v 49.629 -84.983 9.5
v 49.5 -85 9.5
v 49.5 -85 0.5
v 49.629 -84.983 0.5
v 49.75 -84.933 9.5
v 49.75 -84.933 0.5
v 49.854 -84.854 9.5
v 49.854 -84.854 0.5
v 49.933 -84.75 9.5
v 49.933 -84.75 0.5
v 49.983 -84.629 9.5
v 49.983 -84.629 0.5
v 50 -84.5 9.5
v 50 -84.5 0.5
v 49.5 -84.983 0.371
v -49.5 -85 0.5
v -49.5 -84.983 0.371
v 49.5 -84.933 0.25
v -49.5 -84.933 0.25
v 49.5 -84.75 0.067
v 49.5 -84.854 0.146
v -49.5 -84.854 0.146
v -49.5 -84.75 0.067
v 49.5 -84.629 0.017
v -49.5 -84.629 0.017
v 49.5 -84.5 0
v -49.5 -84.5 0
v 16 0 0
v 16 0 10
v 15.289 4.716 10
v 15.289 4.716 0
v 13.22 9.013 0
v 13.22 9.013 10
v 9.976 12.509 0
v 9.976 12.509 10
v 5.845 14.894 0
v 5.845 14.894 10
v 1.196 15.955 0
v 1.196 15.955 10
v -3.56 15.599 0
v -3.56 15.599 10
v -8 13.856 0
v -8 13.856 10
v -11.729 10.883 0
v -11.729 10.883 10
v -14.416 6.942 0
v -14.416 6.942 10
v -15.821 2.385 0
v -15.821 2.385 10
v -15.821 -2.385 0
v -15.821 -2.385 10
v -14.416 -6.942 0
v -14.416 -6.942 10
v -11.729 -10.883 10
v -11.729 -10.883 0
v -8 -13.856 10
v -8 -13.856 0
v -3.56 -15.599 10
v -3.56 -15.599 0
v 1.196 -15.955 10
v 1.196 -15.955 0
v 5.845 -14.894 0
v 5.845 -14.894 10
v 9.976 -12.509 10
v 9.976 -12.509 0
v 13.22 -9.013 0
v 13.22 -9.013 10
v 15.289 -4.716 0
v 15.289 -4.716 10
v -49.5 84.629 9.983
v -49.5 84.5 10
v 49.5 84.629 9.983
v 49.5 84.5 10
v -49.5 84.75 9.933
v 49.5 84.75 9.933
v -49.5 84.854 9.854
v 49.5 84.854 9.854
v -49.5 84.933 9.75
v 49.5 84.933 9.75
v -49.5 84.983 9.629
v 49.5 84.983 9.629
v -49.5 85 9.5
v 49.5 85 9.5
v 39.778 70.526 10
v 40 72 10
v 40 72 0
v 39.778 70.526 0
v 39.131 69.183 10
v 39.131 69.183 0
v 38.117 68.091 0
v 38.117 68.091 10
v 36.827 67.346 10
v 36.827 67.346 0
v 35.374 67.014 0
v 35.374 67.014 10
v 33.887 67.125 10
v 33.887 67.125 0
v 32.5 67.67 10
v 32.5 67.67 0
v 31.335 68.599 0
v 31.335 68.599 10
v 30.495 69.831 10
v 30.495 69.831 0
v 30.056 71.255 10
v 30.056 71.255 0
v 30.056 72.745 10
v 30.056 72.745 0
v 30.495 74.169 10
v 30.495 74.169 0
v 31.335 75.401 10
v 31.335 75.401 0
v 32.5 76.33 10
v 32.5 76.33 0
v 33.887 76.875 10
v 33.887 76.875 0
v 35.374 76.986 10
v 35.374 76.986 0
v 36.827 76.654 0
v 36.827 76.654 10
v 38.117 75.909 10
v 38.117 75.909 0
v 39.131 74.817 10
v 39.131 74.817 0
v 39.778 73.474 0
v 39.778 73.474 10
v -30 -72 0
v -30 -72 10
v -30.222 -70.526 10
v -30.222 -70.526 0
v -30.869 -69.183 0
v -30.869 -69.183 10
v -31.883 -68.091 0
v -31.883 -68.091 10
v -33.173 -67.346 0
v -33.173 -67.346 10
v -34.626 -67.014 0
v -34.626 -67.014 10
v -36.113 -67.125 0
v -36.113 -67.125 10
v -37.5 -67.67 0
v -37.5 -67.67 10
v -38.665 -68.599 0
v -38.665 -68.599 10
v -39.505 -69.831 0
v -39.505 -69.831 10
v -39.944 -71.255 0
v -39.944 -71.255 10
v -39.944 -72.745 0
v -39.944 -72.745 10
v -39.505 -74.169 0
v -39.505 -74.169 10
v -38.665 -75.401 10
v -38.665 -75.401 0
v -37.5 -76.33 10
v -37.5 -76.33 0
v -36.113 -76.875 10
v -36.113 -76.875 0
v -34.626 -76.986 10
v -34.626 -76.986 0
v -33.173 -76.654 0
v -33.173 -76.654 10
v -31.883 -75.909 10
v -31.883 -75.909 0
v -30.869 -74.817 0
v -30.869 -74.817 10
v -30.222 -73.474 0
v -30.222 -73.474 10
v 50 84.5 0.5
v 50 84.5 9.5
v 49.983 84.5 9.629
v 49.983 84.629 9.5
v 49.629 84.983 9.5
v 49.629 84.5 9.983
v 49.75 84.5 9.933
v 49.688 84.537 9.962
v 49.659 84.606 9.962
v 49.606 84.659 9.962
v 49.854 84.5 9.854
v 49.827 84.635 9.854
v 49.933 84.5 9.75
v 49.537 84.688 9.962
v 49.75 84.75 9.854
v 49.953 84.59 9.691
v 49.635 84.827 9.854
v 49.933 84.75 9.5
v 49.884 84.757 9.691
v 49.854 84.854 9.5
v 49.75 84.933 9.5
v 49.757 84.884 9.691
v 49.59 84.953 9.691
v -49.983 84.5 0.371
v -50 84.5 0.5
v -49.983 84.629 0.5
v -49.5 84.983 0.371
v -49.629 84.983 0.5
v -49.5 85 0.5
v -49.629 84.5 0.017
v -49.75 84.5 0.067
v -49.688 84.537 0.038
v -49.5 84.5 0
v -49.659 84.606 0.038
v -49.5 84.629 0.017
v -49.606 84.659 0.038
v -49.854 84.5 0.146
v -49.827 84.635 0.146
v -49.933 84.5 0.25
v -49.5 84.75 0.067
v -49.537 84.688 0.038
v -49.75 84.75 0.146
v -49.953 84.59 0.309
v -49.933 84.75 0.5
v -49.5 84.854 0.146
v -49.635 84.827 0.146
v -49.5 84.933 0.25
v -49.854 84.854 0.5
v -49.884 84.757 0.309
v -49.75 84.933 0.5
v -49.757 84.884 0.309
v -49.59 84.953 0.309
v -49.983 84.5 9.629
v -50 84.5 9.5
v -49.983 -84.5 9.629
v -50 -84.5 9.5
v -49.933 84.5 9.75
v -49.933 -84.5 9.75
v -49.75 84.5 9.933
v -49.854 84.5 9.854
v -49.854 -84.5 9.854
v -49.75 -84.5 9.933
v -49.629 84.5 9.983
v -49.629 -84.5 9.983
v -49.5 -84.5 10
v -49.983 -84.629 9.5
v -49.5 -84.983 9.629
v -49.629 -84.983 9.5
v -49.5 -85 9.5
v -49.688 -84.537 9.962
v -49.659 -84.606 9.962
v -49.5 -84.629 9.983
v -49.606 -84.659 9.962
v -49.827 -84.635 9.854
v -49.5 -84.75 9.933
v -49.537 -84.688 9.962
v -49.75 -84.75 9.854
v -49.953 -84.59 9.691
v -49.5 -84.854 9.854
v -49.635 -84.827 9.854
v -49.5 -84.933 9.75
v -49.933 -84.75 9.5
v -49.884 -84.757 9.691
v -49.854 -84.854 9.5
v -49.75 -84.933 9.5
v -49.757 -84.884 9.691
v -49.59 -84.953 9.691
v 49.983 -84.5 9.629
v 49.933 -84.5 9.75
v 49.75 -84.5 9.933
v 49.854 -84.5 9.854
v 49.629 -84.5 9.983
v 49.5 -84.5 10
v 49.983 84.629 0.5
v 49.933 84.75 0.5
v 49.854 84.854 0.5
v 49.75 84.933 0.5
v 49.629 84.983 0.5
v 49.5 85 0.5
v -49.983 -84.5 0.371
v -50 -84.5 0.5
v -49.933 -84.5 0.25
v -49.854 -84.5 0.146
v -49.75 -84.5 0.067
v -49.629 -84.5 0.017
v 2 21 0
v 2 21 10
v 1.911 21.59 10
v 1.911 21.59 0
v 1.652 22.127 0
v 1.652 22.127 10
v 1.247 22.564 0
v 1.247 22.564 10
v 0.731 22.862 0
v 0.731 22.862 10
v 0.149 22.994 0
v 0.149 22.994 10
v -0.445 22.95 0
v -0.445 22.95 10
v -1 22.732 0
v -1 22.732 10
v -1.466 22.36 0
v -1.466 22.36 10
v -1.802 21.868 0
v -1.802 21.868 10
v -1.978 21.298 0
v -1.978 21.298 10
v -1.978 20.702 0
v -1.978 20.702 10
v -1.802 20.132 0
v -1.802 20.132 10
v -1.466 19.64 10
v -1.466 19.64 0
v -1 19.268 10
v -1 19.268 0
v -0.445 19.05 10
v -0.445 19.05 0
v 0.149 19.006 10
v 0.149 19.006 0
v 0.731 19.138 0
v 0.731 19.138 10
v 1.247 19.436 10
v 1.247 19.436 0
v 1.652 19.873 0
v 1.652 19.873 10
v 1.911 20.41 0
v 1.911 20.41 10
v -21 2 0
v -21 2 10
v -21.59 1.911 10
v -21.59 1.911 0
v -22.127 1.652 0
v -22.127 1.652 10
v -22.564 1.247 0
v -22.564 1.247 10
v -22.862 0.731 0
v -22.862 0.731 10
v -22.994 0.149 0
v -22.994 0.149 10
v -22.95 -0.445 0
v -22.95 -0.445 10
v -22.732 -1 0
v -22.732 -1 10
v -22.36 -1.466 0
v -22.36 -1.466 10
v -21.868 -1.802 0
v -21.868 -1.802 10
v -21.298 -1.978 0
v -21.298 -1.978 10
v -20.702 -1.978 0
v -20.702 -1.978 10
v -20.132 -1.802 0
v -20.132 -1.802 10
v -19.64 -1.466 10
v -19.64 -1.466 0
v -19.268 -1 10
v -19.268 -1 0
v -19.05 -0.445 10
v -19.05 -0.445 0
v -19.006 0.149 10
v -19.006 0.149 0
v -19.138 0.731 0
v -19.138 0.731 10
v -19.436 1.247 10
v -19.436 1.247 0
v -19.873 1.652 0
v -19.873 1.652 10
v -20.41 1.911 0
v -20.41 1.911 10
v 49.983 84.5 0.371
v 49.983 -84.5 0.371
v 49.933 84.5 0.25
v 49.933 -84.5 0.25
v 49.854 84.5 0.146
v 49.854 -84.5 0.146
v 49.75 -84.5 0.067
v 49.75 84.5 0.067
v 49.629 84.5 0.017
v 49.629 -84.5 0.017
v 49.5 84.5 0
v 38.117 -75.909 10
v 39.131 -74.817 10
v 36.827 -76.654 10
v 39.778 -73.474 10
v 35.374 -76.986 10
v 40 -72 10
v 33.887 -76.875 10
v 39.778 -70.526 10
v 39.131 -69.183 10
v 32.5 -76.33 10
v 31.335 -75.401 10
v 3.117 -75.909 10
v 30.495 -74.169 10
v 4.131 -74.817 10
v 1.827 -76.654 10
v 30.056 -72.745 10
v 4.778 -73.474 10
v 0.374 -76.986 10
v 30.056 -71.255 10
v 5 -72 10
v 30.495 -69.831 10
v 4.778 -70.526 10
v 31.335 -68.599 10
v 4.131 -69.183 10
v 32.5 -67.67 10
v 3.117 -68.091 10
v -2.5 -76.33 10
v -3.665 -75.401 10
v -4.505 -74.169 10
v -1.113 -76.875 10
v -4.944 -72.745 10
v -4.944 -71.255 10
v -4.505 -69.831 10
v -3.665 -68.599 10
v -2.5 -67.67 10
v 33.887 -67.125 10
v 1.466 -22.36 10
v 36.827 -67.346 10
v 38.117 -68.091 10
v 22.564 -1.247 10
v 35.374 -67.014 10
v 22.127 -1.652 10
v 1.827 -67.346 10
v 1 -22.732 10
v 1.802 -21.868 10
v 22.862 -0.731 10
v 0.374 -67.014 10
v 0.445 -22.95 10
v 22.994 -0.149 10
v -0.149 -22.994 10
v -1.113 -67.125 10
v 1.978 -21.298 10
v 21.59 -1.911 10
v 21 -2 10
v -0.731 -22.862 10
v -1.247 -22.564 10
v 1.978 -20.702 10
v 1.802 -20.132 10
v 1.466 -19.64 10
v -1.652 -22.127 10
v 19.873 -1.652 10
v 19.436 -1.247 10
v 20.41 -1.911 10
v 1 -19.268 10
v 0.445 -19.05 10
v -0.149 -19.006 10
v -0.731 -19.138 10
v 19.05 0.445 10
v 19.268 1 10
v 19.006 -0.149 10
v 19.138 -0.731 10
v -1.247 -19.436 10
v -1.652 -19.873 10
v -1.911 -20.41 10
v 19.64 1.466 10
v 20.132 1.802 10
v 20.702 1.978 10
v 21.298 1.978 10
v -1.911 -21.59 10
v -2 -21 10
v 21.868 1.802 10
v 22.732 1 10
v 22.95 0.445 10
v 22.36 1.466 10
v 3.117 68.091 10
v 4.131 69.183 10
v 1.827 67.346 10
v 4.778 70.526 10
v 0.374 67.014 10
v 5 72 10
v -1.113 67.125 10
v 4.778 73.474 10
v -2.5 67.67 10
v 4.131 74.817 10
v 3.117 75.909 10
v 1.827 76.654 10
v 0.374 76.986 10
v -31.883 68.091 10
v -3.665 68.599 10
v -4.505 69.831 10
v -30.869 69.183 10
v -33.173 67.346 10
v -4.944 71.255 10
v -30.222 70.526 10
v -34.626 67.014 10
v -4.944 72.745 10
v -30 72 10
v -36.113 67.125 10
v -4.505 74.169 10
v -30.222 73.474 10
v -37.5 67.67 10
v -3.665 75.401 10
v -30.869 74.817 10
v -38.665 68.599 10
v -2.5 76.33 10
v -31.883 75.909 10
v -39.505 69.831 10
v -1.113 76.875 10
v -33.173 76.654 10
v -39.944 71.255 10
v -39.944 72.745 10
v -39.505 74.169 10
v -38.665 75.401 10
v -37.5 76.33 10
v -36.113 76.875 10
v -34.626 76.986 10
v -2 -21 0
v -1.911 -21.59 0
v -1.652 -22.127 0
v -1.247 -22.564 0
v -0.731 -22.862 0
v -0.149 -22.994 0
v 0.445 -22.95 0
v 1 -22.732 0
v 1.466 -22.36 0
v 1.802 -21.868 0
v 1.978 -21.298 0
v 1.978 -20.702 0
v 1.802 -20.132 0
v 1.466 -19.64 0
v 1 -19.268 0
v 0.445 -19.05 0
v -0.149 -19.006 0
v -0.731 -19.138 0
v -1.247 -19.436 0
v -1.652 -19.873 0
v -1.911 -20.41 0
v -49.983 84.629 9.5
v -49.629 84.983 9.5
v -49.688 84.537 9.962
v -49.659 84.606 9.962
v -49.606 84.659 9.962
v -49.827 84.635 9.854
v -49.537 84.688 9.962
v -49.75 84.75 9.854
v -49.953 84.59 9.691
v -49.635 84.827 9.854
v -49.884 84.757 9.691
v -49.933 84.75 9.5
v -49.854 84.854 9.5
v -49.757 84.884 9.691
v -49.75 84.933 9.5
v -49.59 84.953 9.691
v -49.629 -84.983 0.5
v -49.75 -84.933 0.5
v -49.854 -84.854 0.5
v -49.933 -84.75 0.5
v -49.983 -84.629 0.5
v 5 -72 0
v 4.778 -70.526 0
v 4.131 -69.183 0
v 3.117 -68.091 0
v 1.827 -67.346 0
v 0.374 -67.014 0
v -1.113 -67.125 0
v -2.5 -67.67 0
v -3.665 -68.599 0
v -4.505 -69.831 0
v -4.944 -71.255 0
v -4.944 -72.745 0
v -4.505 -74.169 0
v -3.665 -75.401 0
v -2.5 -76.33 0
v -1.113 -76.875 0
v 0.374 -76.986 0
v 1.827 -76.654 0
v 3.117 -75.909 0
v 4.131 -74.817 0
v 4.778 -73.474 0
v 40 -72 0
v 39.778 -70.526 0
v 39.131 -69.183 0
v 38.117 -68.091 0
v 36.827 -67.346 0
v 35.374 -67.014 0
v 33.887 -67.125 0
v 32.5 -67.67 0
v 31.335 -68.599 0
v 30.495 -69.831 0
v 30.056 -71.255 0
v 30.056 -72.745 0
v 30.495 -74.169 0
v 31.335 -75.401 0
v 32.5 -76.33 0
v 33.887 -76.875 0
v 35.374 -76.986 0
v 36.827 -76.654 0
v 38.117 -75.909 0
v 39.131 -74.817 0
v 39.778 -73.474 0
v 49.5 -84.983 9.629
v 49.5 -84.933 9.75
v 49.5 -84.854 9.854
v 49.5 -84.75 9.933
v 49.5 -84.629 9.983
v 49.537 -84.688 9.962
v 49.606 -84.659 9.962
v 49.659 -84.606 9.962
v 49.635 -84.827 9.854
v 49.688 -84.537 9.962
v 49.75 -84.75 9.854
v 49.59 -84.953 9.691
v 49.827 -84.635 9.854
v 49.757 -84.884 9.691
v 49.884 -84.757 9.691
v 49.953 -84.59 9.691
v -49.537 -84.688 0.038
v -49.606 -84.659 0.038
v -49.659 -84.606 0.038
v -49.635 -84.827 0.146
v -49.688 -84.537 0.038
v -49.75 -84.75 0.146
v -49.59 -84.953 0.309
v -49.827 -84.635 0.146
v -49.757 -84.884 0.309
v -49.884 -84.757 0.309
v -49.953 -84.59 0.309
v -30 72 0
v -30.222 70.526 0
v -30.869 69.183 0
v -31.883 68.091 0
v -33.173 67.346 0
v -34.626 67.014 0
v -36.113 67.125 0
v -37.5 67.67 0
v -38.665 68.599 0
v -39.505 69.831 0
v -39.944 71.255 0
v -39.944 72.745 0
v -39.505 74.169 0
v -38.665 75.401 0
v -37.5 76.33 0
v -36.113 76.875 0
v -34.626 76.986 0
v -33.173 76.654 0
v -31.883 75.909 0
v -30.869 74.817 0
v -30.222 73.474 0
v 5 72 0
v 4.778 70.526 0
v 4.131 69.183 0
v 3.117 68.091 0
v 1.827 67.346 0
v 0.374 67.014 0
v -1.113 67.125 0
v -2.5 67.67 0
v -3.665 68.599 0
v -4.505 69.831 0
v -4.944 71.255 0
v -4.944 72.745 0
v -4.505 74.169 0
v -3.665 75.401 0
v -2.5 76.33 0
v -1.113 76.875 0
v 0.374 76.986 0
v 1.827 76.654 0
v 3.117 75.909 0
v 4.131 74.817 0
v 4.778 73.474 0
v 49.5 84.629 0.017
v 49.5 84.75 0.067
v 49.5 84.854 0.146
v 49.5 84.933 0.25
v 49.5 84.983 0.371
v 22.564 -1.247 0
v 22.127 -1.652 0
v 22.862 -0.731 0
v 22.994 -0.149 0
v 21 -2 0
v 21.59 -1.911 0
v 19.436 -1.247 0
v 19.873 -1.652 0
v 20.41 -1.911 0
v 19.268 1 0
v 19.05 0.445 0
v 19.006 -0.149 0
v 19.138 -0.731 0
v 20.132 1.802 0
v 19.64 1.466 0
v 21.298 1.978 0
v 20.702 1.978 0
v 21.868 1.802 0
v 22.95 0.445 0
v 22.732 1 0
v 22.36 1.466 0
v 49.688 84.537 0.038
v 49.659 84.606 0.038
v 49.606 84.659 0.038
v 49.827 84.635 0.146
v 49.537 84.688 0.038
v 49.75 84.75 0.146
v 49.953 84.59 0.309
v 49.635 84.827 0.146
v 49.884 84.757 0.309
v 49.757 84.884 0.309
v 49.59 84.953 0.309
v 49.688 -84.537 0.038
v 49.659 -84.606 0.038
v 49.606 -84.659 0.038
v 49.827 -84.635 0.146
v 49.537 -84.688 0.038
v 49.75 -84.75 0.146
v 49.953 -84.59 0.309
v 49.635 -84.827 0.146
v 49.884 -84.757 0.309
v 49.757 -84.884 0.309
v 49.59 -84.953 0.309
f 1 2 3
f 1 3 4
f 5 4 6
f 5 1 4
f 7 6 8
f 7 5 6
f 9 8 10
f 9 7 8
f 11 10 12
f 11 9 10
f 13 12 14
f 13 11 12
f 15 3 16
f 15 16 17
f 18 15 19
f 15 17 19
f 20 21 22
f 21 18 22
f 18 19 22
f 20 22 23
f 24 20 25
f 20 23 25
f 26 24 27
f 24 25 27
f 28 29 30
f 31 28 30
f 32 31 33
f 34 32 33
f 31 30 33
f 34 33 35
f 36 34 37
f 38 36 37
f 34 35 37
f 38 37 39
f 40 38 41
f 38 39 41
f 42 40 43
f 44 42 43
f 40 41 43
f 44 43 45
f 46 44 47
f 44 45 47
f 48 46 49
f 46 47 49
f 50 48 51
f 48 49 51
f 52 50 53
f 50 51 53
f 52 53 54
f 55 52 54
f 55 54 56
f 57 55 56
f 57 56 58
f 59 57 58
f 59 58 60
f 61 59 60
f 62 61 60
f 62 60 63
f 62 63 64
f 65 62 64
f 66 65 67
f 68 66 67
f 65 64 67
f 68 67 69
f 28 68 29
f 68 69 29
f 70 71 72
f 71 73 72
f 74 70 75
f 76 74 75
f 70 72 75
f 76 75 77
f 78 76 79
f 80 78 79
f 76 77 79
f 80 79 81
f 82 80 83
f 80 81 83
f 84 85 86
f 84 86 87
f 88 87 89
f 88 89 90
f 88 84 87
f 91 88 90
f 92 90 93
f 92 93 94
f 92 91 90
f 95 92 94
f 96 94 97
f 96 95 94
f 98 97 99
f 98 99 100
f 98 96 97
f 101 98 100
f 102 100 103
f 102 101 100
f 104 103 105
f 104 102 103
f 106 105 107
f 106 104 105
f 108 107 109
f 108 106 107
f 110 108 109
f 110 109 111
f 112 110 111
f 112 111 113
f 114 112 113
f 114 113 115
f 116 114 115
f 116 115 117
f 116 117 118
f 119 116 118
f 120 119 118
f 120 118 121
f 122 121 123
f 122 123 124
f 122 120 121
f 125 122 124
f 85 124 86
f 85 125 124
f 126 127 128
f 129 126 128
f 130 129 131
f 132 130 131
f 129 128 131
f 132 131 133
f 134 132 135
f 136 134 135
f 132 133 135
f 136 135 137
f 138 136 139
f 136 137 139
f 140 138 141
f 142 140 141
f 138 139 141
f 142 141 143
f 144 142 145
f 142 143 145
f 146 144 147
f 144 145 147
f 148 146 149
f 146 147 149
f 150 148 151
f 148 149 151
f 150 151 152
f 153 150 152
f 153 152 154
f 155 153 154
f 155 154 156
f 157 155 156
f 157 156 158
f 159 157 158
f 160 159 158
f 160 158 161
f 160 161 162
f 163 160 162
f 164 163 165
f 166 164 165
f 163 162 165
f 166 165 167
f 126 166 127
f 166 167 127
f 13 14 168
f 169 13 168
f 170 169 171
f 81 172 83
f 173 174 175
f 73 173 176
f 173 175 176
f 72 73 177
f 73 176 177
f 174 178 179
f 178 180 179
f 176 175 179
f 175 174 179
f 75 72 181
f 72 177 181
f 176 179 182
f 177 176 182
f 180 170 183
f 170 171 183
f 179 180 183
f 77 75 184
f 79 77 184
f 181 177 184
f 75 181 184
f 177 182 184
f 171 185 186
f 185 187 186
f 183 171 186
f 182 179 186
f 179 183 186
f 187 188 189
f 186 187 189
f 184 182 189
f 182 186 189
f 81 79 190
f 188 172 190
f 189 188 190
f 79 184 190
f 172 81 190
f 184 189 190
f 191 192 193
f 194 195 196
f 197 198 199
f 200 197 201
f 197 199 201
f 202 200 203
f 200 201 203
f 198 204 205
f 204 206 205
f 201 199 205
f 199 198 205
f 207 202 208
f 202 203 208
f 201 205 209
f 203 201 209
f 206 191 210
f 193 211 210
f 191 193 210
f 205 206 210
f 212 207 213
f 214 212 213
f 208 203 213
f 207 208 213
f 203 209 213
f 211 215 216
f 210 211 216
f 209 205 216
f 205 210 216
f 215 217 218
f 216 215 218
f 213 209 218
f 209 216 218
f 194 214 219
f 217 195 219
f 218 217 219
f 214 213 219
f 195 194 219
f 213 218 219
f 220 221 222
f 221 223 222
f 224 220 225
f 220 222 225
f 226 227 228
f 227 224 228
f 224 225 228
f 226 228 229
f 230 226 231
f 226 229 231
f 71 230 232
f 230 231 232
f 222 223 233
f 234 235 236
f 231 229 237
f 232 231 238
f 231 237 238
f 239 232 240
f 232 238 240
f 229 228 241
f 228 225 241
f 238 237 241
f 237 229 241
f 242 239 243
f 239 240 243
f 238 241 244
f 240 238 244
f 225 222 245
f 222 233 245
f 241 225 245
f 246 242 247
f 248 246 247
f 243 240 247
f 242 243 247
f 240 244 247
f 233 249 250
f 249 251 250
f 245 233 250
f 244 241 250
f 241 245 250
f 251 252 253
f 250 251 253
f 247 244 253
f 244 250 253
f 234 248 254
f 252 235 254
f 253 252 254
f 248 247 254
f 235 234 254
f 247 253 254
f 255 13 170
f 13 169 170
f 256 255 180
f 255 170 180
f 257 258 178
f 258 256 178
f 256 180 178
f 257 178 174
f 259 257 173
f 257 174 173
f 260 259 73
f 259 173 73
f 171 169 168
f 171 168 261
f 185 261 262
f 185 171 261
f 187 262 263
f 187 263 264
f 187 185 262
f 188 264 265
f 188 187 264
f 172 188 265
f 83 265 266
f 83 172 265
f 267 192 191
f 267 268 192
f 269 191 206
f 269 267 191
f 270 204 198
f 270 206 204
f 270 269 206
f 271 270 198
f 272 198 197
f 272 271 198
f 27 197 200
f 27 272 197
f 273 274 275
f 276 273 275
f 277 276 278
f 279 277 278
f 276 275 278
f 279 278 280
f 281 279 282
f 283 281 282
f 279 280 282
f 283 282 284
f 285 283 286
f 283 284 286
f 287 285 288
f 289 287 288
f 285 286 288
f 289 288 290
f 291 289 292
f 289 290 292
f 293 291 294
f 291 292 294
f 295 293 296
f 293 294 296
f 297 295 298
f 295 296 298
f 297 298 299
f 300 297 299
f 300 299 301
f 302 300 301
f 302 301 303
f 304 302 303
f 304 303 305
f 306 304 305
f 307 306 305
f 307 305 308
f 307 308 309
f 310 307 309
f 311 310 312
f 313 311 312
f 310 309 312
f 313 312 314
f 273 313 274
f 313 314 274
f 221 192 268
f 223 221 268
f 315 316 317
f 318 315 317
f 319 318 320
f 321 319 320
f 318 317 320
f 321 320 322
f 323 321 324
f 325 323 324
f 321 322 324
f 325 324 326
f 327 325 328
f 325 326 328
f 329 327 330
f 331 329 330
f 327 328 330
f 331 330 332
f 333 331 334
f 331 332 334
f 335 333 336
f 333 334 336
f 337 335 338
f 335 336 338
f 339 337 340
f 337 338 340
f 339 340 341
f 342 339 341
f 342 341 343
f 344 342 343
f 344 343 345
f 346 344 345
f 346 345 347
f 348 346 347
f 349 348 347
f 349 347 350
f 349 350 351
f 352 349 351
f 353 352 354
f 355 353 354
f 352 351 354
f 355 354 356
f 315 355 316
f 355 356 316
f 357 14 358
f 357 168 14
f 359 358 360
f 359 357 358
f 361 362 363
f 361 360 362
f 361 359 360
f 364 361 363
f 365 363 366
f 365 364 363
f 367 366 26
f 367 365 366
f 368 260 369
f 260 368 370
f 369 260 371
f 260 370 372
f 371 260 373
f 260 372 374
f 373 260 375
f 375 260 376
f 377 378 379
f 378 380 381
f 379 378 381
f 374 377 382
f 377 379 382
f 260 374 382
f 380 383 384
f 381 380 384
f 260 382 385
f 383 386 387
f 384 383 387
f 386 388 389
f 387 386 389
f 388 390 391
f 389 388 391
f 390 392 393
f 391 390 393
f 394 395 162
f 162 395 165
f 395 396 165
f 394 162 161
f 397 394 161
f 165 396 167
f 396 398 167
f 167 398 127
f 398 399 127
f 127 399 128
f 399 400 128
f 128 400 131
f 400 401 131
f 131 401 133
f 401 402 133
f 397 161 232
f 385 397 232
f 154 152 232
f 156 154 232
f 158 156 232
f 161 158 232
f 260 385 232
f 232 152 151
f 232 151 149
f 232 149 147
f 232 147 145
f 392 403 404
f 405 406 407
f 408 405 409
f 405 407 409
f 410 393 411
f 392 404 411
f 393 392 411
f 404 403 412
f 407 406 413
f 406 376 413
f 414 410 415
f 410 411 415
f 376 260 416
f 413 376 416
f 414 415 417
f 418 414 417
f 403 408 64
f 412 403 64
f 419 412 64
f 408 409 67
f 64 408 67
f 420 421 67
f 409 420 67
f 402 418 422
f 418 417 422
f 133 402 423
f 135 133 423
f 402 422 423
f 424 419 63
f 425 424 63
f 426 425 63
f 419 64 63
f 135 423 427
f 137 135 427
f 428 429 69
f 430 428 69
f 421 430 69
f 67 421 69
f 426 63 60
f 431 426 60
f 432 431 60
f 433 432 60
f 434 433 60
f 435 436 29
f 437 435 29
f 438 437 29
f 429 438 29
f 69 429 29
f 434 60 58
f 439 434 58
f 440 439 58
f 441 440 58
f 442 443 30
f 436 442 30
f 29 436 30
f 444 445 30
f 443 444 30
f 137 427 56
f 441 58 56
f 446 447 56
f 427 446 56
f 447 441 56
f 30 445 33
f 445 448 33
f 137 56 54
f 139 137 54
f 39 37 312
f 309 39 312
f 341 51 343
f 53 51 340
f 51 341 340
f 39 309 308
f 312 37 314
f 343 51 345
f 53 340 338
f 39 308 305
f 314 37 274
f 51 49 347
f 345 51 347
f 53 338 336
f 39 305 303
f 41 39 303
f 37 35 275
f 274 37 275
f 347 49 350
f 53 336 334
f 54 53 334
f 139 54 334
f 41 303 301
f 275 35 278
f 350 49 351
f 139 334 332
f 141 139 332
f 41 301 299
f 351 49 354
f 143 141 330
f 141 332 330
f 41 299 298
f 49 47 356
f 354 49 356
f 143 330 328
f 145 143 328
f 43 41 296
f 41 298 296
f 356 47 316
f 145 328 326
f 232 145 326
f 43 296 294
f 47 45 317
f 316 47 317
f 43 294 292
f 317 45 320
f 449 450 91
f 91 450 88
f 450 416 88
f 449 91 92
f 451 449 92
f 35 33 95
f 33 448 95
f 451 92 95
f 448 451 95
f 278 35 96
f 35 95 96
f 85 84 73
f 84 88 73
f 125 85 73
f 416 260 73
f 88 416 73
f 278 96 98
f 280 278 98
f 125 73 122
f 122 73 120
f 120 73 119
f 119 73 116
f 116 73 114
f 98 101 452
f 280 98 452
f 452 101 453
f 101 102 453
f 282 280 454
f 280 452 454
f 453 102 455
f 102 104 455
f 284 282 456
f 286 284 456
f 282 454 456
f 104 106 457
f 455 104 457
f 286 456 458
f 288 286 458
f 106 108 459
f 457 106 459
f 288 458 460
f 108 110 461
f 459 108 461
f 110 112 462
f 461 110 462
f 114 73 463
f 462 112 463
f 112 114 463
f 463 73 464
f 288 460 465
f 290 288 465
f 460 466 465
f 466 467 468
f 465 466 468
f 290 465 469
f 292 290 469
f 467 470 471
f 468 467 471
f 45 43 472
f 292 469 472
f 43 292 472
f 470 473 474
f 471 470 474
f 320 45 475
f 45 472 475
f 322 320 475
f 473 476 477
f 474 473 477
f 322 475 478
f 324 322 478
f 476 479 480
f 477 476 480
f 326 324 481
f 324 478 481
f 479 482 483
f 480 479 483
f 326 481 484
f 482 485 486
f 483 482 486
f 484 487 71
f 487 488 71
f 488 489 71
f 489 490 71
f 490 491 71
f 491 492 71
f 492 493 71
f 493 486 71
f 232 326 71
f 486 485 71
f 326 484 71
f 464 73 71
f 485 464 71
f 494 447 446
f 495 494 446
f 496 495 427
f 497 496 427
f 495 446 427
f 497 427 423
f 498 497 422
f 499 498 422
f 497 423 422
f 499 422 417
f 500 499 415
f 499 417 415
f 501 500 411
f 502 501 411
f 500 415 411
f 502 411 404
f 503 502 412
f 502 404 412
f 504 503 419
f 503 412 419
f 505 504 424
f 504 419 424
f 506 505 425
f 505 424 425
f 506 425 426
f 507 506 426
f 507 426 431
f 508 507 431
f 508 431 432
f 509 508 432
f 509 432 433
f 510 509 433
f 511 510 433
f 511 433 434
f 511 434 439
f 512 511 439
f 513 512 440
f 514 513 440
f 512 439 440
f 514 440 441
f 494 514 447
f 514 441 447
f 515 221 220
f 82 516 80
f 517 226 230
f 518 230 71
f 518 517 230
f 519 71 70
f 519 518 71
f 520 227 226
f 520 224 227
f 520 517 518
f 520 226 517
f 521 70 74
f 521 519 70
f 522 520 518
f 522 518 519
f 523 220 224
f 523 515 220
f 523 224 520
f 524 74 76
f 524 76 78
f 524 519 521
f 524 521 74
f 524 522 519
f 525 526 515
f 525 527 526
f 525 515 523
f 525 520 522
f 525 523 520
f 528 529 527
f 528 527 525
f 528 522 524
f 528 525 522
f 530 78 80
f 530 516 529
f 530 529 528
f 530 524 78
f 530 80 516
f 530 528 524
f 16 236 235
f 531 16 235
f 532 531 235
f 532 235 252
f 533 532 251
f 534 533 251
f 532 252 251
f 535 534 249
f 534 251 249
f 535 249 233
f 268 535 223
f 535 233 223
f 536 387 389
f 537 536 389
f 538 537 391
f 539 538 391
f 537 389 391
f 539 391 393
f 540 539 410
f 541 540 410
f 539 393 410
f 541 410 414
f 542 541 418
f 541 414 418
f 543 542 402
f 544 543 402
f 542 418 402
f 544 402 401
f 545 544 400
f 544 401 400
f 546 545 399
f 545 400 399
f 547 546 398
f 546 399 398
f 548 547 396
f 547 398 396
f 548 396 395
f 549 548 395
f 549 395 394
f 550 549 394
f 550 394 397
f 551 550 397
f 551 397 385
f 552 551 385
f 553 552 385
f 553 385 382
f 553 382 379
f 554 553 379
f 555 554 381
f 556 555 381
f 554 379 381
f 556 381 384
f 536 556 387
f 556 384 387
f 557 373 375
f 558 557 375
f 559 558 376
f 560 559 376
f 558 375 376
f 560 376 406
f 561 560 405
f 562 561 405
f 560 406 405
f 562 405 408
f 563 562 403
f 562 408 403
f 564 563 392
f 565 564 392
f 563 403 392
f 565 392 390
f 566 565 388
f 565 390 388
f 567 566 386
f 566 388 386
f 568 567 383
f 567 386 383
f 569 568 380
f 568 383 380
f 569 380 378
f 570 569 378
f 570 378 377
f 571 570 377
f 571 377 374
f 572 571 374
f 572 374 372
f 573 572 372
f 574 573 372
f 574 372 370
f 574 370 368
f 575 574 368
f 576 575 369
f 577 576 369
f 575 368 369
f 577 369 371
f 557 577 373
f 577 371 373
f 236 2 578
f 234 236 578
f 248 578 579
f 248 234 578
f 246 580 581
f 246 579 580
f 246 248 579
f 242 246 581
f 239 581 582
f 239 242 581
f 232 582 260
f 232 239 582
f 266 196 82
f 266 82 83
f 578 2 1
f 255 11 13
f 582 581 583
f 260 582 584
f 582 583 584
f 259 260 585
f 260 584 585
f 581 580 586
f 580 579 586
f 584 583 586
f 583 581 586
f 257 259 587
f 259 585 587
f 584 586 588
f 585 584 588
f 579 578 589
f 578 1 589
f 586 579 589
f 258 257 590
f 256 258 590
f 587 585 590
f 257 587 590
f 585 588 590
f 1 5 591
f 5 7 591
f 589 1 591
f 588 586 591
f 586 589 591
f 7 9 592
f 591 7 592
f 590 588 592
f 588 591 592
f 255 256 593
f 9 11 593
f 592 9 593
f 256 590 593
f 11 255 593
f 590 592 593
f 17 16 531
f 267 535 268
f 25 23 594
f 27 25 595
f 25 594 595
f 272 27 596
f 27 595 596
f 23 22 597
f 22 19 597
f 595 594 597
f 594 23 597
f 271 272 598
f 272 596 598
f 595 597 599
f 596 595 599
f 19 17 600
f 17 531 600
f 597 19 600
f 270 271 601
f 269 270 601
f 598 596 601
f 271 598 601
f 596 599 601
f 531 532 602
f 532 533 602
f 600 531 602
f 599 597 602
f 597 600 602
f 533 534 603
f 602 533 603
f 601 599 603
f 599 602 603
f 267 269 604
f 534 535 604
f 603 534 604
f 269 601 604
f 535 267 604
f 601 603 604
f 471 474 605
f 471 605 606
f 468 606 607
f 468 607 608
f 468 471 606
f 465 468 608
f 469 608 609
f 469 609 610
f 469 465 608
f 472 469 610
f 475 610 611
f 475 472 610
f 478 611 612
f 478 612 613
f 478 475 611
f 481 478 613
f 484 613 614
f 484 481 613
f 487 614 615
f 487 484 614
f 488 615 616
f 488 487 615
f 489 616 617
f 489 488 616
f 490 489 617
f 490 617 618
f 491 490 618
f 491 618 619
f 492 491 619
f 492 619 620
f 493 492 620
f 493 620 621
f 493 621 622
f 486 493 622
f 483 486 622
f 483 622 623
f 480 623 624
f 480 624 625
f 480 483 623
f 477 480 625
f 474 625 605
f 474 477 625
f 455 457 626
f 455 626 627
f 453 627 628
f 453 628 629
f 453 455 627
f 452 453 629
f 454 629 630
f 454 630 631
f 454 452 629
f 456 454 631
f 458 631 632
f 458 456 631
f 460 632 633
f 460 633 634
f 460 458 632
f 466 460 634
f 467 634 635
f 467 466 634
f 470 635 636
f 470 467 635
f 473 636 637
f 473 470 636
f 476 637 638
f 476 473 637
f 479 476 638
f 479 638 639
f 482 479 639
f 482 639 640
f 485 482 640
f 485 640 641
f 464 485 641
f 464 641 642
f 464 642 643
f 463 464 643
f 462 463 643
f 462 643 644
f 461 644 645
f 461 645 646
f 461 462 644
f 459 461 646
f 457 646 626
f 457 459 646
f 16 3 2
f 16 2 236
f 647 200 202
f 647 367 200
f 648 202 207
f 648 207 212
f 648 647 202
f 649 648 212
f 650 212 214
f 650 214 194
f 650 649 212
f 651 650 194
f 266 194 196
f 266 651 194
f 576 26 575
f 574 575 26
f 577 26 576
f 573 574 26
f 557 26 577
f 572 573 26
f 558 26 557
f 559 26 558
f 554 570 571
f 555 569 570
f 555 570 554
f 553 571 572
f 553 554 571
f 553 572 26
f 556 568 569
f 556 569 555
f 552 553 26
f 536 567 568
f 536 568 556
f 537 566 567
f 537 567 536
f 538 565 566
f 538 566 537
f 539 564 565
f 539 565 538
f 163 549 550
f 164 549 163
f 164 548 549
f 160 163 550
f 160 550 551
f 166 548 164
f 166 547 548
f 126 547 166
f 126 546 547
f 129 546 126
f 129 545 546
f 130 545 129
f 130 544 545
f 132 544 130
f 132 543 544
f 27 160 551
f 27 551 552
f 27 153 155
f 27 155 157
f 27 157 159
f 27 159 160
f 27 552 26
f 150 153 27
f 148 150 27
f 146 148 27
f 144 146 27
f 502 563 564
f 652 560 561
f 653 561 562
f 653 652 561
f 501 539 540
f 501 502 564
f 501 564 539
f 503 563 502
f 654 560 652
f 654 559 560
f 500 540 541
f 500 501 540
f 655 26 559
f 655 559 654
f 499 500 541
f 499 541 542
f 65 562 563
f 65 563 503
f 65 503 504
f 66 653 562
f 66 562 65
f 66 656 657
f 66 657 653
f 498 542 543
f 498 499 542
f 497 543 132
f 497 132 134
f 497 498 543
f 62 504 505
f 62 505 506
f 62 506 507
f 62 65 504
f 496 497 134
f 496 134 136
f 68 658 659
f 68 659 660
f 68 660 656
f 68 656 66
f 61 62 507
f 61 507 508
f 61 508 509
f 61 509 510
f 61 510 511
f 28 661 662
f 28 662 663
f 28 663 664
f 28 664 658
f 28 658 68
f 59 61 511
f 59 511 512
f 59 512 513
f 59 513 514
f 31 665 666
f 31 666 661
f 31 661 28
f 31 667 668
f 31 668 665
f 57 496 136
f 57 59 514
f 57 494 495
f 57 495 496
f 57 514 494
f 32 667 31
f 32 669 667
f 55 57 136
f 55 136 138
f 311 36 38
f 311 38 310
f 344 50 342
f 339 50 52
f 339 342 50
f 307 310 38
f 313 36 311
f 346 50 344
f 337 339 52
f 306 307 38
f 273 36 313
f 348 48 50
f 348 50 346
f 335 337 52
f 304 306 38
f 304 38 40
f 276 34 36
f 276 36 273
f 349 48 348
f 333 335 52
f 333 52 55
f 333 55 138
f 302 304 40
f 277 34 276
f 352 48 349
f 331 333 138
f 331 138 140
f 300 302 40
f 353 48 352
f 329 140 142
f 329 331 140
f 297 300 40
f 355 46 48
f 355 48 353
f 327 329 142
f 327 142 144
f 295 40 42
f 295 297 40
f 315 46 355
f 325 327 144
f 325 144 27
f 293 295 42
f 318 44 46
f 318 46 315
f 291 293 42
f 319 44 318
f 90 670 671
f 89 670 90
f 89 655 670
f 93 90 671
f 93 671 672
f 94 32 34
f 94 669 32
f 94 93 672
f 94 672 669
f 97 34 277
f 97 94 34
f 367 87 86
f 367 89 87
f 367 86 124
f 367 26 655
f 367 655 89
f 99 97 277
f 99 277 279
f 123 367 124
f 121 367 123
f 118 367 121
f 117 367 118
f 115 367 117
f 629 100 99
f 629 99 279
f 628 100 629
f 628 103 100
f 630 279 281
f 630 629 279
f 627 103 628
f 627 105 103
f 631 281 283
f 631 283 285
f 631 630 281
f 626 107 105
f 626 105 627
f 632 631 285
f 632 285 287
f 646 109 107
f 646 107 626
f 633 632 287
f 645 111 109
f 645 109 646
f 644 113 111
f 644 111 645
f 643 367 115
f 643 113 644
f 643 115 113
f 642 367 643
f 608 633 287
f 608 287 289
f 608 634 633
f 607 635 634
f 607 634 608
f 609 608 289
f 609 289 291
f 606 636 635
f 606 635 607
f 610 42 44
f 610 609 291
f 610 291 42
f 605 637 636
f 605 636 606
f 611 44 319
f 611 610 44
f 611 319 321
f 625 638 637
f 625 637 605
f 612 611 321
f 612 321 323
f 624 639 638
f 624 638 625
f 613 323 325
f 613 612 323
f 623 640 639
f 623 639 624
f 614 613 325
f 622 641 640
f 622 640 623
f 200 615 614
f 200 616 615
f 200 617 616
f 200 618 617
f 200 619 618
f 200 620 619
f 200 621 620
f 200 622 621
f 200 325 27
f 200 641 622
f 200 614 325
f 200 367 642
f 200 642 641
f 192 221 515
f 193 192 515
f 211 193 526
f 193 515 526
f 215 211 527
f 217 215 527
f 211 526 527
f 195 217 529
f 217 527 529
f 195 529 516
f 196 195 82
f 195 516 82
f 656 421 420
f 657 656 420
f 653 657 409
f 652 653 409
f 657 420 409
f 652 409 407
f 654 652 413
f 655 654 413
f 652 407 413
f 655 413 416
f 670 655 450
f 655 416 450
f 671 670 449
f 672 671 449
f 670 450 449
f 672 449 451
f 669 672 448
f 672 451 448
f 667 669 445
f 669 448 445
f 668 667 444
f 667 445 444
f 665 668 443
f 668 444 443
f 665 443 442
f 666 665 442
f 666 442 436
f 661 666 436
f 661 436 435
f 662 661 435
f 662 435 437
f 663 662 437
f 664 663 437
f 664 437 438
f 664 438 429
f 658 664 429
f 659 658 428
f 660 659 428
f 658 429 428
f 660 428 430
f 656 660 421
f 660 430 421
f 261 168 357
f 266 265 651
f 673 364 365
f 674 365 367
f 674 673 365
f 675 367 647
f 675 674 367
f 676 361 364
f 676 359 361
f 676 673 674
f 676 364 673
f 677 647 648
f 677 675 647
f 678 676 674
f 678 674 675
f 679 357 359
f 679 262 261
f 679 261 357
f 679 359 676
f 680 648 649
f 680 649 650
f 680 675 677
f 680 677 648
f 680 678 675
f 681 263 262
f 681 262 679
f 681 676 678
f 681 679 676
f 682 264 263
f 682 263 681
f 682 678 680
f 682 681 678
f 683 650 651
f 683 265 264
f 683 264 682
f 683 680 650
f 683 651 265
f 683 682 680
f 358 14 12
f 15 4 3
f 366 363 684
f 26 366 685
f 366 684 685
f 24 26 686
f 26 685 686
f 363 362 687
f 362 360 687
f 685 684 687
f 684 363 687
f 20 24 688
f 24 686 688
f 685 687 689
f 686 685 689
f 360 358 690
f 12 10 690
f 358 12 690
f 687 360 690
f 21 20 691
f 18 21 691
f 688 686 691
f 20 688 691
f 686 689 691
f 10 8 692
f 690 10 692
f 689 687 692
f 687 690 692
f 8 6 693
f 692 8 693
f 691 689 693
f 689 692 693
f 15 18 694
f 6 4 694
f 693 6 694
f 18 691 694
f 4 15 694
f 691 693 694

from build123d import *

# Parameters (mm, degrees)
EXTRUDE_1_DEPTH          = 10
SKETCH_2_R               = 16
CUT_EXTRUDE_1_DEPTH      = 10
SKETCH_3_R               = 5
CUT_EXTRUDE_2_DEPTH      = 10
SKETCH_6_R               = 2
CUT_EXTRUDE_4_DEPTH      = 10
PATTERN_CIRCULAR_1_COUNT = 4
FILLET_1_R               = 0.5


with BuildPart() as part:
    # 草图1 → 凸台-拉伸1 (new body)
    with BuildSketch(Plane.XY):
        Polygon((50, -85), (-50, -85), (-50, -20), (-50, 85), (50, 85), (50, 0), align=None)
    extrude(amount=EXTRUDE_1_DEPTH)

    # 草图2 → 切除-拉伸1 (cut)
    with BuildSketch(Plane.XY.offset(10)):
        Circle(SKETCH_2_R)
    extrude(amount=-CUT_EXTRUDE_1_DEPTH, mode=Mode.SUBTRACT)

    # 草图3 → 切除-拉伸2 (cut)
    with BuildSketch(Plane.XY.offset(10)):
        with Locations((0, -72)):
            Circle(SKETCH_3_R)
        with Locations((35, -72)):
            Circle(SKETCH_3_R)
        with Locations((-35, -72)):
            Circle(SKETCH_3_R)
    cut_extrude_2 = extrude(amount=-CUT_EXTRUDE_2_DEPTH, mode=Mode.SUBTRACT)

    # 草图6 → 切除-拉伸4 (cut)
    with BuildSketch(Plane.XY.offset(10)):
        with Locations((0, 21)):
            Circle(SKETCH_6_R)
    cut_extrude_4 = extrude(amount=-CUT_EXTRUDE_4_DEPTH, mode=Mode.SUBTRACT)

    # 阵列(圆周)1: 切除-拉伸4 ×4 about axis
    pattern_circular_1_axis = Axis((0, 0, 0), (0, 0, 1))
    for i in range(1, PATTERN_CIRCULAR_1_COUNT):
        add(cut_extrude_4.rotate(pattern_circular_1_axis, i * 360 / PATTERN_CIRCULAR_1_COUNT), mode=Mode.SUBTRACT)

    # 镜向1: 切除-拉伸2 across plane
    add(cut_extrude_2.mirror(Plane.ZX), mode=Mode.SUBTRACT)

    # 圆角1
    fillet_1_edges = [part.edges().sort_by_distance(p)[0] for p in [
        (50, -85, 5),
        (-50, -85, 5),
        (-50, 85, 5),
        (50, 85, 5),
        (-50, 0, 10),
        (0, -85, 10),
        (50, 0, 10),
        (50, 0, 0),
        (0, -85, 0),
        (-50, 0, 0),
        (0, 85, 0),
        (0, 85, 10),
    ]]
    fillet(fillet_1_edges, radius=FILLET_1_R)


solid = part.part
